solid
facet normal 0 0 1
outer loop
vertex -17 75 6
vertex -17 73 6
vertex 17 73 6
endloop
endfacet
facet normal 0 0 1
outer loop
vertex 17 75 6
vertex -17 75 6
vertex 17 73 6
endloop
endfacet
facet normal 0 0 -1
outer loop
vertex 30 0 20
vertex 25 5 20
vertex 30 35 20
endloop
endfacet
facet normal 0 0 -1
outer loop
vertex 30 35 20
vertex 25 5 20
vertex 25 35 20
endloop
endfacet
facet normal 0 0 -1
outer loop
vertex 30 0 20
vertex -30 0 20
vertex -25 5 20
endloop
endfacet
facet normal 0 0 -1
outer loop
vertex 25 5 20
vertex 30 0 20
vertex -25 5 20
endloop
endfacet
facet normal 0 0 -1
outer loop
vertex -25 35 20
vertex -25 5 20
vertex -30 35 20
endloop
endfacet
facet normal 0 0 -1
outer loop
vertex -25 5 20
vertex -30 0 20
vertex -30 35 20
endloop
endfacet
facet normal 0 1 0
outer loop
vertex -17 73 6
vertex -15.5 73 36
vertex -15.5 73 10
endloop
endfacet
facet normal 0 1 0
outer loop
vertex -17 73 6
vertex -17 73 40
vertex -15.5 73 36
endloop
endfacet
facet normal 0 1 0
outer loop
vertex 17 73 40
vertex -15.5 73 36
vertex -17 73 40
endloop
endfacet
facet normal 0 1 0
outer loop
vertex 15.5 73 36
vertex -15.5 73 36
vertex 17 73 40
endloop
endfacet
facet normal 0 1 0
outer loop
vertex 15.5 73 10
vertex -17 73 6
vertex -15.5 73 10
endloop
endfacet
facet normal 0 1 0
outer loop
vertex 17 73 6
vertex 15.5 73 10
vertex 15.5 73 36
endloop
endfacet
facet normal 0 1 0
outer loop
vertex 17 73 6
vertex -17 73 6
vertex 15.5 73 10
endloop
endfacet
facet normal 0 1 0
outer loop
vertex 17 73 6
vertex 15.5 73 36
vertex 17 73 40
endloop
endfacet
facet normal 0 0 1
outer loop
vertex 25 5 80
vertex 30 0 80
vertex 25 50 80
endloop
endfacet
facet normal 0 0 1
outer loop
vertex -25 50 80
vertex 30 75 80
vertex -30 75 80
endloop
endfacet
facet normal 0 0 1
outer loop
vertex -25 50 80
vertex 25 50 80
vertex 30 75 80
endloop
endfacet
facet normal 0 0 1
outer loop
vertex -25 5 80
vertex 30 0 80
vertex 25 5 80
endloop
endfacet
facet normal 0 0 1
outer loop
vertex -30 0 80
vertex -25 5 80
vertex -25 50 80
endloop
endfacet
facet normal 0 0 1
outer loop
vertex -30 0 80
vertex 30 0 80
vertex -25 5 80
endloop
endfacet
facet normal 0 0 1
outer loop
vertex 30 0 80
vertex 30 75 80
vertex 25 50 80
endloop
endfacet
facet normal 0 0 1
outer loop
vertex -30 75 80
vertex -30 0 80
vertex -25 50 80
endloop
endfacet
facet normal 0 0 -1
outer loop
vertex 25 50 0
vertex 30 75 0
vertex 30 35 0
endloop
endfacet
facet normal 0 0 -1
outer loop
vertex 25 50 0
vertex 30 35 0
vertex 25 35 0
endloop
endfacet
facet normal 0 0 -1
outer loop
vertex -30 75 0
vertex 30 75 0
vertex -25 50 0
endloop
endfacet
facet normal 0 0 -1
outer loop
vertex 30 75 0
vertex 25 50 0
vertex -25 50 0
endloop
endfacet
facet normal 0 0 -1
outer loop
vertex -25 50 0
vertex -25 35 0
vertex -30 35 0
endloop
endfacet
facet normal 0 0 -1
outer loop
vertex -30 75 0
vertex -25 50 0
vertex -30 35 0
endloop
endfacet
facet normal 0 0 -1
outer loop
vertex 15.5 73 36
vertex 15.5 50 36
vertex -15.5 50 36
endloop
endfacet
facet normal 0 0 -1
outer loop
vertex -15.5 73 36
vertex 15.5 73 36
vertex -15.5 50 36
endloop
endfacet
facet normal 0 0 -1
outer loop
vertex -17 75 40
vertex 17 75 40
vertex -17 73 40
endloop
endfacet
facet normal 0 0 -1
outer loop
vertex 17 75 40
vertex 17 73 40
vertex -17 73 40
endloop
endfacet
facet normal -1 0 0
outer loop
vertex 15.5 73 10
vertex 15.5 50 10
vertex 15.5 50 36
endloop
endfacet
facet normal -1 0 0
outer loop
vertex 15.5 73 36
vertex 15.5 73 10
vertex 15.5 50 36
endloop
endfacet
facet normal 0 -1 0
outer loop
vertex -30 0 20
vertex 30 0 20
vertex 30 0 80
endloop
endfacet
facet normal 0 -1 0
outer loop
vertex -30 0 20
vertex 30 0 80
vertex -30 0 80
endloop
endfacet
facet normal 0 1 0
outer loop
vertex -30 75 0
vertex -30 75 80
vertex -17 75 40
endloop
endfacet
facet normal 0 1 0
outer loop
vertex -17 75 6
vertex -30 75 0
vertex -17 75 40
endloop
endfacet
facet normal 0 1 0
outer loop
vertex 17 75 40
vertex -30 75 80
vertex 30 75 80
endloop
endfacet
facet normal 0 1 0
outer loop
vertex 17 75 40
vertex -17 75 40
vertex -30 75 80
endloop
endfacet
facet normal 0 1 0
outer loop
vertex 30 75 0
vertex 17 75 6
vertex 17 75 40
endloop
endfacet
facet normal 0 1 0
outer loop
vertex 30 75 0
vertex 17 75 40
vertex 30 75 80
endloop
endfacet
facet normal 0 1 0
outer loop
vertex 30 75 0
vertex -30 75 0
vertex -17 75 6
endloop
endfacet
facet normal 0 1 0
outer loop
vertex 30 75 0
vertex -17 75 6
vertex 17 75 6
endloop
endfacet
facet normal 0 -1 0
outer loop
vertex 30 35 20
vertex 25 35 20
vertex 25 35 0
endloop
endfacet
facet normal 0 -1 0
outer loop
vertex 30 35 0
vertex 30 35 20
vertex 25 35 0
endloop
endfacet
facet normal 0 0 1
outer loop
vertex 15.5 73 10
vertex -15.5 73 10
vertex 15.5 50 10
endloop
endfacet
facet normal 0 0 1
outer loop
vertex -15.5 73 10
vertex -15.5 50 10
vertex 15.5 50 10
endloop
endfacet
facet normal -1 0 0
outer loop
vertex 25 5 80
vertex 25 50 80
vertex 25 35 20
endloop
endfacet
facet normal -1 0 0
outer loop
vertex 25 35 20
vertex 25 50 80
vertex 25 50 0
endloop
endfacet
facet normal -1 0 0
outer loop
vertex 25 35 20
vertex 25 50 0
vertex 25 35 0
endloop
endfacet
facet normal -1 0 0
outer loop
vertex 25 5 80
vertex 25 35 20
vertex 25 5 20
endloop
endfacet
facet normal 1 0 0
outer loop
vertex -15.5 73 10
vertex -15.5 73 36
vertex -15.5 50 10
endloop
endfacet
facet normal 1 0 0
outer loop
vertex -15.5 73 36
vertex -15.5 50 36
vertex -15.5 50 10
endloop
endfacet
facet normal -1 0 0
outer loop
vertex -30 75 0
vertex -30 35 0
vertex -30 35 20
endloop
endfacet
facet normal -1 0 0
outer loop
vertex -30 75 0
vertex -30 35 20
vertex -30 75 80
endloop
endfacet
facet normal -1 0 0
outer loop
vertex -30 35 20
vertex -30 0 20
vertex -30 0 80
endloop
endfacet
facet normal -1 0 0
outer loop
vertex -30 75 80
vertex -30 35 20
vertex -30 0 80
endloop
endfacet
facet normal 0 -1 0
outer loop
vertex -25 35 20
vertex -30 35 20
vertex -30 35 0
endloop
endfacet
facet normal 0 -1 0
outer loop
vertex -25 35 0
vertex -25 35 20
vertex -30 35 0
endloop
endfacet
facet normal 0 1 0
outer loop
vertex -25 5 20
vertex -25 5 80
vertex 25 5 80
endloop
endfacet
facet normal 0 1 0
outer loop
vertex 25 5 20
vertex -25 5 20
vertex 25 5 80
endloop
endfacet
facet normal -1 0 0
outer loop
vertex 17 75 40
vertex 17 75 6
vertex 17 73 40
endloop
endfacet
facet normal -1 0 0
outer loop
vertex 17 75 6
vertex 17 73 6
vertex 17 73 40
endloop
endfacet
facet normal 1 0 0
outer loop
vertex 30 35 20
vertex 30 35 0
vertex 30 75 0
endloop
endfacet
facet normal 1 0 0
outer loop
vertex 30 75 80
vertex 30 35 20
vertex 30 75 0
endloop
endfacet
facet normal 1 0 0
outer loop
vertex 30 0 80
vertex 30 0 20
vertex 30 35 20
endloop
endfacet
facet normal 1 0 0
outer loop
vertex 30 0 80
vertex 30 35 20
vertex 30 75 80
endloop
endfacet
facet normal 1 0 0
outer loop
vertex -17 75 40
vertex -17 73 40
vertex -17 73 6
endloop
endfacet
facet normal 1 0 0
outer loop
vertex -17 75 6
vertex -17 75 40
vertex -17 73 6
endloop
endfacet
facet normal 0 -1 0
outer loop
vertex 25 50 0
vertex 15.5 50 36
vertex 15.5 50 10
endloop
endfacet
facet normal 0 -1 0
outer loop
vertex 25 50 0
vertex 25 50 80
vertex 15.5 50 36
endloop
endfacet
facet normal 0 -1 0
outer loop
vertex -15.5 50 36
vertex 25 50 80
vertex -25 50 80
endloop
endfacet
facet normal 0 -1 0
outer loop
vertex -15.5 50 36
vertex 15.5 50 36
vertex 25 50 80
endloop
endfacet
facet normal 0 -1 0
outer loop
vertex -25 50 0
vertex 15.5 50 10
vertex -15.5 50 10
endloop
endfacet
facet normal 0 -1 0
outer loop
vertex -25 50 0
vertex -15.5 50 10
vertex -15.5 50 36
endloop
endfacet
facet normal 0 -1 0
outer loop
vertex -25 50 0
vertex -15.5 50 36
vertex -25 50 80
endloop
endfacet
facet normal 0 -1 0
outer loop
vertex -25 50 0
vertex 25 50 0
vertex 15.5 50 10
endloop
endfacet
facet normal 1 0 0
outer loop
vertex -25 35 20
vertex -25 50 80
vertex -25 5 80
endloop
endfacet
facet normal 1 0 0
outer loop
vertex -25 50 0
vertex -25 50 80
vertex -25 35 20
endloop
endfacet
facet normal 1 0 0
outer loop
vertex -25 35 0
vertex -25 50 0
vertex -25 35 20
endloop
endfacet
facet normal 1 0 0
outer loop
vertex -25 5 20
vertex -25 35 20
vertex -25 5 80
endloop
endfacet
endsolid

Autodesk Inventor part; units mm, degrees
ref_plane "YZ Plane" through (0, 0, 0) normal (1, 0, 0) x (0, 1, 0)
ref_plane "XZ Plane" through (0, 0, 0) normal (0, 1, 0) x (-1, 0, 0)
ref_plane "XY Plane" through (0, 0, 0) normal (0, 0, 1) x (1, 0, 0)
sketch "Sketch1" plane through (0, 0, 0) normal (0, 0, 1) x (1, 0, 0)
  line L0 (0, 0) -> (0, 50) construction
  line L1 (0, 0) -> (-30, 0)
  line L2 (-30, 0) -> (-30, 55)
  line L3 (-30, 55) -> (0, 55)
  line L4 (0, 55) -> (0, 50) construction
  line L5 (0, 50) -> (-25, 50)
  line L6 (-25, 50) -> (-25, 5)
  line L7 (-25, 5) -> (0, 5)
  line L8 (0, 5) -> (0, 0) construction
  line L9 (0, 0) -> (30, 0)
  line L10 (30, 0) -> (30, 55)
  line L11 (30, 55) -> (0, 55)
  line L12 (0, 50) -> (25, 50)
  line L13 (25, 50) -> (25, 5)
  line L14 (25, 5) -> (0, 5)
  dimension "d0" = 50
  dimension "d1" = 30
  dimension "d2" = 55
  dimension "d3" = 25
  dimension "d4" = 45
extrude "Extrusion1" add sketch "Sketch1" along normal blind 80
sketch "Sketch2" plane through (-30, 55, 0) normal (0, 1, 0) x (1, 0, 0)
  line L0 (13, -6) -> (47, -6)
  line L1 (47, -6) -> (47, -40)
  line L2 (47, -40) -> (13, -40)
  line L3 (13, -40) -> (13, -6)
  line L4 (13, -6) -> (47, -40) construction
  line L5 (47, -6) -> (13, -40) construction
  line L6 (14.5, -10) -> (45.5, -10)
  line L7 (45.5, -10) -> (45.5, -36)
  line L8 (45.5, -36) -> (14.5, -36)
  line L9 (14.5, -36) -> (14.5, -10)
  line L10 (14.5, -10) -> (45.5, -36) construction
  line L11 (45.5, -10) -> (14.5, -36) construction
  line L12 (0, 0) -> (0, -80) projected
  line L13 (60, 0) -> (0, 0) projected
  line L14 (60, -80) -> (0, -80) projected
  line L15 (60, 0) -> (60, -80) projected
  point P0 (30, 0)
  point P1 (30, -23)
  dimension "d7" = 34
  dimension "d8" = 34
  dimension "d9" = 31
  dimension "d10" = 26
  dimension "d11" = 30
  dimension "d12" = 23
extrude "Extrusion2" cut sketch "Sketch2" against normal blind 10 contours L6 L7 L8 L9
extrude "Extrusion3" add sketch "Sketch2" along normal blind 10 contours L0 L1 L2 L3
extrude "Extrusion4" add sketch "Sketch2" along normal blind 20 contours L13 L15 L14 L12
sketch "Sketch3" plane through (-30, 0, 0) normal (-1, 0, 0) x (0, 0, 1)
  line L0 (0, 0) -> (20, 0)
  line L1 (20, 0) -> (20, 35)
  line L2 (20, 35) -> (0, 35)
  line L3 (0, 35) -> (0, 0)
  dimension "d19" = 20
  dimension "d20" = 35
extrude "Extrusion5" cut sketch "Sketch3" against normal through all
sketch "Sketch4" plane through (-30, 65, 0) normal (0, 1, 0) x (1, 0, 0)
  line L0 (13, -40) -> (47, -40) projected
  line L1 (47, -40) -> (47, -6) projected
  line L2 (47, -6) -> (13, -6) projected
  line L3 (13, -6) -> (13, -40) projected
  line L4 (14.5, -36) -> (14.5, -10) projected
  line L5 (14.5, -10) -> (45.5, -10) projected
  line L6 (45.5, -10) -> (45.5, -36) projected
  line L7 (45.5, -36) -> (14.5, -36) projected
  point P0 (30, 0)
extrude "Extrusion6" add sketch "Sketch4" along normal blind 8
properties part number "color sensor holder"
